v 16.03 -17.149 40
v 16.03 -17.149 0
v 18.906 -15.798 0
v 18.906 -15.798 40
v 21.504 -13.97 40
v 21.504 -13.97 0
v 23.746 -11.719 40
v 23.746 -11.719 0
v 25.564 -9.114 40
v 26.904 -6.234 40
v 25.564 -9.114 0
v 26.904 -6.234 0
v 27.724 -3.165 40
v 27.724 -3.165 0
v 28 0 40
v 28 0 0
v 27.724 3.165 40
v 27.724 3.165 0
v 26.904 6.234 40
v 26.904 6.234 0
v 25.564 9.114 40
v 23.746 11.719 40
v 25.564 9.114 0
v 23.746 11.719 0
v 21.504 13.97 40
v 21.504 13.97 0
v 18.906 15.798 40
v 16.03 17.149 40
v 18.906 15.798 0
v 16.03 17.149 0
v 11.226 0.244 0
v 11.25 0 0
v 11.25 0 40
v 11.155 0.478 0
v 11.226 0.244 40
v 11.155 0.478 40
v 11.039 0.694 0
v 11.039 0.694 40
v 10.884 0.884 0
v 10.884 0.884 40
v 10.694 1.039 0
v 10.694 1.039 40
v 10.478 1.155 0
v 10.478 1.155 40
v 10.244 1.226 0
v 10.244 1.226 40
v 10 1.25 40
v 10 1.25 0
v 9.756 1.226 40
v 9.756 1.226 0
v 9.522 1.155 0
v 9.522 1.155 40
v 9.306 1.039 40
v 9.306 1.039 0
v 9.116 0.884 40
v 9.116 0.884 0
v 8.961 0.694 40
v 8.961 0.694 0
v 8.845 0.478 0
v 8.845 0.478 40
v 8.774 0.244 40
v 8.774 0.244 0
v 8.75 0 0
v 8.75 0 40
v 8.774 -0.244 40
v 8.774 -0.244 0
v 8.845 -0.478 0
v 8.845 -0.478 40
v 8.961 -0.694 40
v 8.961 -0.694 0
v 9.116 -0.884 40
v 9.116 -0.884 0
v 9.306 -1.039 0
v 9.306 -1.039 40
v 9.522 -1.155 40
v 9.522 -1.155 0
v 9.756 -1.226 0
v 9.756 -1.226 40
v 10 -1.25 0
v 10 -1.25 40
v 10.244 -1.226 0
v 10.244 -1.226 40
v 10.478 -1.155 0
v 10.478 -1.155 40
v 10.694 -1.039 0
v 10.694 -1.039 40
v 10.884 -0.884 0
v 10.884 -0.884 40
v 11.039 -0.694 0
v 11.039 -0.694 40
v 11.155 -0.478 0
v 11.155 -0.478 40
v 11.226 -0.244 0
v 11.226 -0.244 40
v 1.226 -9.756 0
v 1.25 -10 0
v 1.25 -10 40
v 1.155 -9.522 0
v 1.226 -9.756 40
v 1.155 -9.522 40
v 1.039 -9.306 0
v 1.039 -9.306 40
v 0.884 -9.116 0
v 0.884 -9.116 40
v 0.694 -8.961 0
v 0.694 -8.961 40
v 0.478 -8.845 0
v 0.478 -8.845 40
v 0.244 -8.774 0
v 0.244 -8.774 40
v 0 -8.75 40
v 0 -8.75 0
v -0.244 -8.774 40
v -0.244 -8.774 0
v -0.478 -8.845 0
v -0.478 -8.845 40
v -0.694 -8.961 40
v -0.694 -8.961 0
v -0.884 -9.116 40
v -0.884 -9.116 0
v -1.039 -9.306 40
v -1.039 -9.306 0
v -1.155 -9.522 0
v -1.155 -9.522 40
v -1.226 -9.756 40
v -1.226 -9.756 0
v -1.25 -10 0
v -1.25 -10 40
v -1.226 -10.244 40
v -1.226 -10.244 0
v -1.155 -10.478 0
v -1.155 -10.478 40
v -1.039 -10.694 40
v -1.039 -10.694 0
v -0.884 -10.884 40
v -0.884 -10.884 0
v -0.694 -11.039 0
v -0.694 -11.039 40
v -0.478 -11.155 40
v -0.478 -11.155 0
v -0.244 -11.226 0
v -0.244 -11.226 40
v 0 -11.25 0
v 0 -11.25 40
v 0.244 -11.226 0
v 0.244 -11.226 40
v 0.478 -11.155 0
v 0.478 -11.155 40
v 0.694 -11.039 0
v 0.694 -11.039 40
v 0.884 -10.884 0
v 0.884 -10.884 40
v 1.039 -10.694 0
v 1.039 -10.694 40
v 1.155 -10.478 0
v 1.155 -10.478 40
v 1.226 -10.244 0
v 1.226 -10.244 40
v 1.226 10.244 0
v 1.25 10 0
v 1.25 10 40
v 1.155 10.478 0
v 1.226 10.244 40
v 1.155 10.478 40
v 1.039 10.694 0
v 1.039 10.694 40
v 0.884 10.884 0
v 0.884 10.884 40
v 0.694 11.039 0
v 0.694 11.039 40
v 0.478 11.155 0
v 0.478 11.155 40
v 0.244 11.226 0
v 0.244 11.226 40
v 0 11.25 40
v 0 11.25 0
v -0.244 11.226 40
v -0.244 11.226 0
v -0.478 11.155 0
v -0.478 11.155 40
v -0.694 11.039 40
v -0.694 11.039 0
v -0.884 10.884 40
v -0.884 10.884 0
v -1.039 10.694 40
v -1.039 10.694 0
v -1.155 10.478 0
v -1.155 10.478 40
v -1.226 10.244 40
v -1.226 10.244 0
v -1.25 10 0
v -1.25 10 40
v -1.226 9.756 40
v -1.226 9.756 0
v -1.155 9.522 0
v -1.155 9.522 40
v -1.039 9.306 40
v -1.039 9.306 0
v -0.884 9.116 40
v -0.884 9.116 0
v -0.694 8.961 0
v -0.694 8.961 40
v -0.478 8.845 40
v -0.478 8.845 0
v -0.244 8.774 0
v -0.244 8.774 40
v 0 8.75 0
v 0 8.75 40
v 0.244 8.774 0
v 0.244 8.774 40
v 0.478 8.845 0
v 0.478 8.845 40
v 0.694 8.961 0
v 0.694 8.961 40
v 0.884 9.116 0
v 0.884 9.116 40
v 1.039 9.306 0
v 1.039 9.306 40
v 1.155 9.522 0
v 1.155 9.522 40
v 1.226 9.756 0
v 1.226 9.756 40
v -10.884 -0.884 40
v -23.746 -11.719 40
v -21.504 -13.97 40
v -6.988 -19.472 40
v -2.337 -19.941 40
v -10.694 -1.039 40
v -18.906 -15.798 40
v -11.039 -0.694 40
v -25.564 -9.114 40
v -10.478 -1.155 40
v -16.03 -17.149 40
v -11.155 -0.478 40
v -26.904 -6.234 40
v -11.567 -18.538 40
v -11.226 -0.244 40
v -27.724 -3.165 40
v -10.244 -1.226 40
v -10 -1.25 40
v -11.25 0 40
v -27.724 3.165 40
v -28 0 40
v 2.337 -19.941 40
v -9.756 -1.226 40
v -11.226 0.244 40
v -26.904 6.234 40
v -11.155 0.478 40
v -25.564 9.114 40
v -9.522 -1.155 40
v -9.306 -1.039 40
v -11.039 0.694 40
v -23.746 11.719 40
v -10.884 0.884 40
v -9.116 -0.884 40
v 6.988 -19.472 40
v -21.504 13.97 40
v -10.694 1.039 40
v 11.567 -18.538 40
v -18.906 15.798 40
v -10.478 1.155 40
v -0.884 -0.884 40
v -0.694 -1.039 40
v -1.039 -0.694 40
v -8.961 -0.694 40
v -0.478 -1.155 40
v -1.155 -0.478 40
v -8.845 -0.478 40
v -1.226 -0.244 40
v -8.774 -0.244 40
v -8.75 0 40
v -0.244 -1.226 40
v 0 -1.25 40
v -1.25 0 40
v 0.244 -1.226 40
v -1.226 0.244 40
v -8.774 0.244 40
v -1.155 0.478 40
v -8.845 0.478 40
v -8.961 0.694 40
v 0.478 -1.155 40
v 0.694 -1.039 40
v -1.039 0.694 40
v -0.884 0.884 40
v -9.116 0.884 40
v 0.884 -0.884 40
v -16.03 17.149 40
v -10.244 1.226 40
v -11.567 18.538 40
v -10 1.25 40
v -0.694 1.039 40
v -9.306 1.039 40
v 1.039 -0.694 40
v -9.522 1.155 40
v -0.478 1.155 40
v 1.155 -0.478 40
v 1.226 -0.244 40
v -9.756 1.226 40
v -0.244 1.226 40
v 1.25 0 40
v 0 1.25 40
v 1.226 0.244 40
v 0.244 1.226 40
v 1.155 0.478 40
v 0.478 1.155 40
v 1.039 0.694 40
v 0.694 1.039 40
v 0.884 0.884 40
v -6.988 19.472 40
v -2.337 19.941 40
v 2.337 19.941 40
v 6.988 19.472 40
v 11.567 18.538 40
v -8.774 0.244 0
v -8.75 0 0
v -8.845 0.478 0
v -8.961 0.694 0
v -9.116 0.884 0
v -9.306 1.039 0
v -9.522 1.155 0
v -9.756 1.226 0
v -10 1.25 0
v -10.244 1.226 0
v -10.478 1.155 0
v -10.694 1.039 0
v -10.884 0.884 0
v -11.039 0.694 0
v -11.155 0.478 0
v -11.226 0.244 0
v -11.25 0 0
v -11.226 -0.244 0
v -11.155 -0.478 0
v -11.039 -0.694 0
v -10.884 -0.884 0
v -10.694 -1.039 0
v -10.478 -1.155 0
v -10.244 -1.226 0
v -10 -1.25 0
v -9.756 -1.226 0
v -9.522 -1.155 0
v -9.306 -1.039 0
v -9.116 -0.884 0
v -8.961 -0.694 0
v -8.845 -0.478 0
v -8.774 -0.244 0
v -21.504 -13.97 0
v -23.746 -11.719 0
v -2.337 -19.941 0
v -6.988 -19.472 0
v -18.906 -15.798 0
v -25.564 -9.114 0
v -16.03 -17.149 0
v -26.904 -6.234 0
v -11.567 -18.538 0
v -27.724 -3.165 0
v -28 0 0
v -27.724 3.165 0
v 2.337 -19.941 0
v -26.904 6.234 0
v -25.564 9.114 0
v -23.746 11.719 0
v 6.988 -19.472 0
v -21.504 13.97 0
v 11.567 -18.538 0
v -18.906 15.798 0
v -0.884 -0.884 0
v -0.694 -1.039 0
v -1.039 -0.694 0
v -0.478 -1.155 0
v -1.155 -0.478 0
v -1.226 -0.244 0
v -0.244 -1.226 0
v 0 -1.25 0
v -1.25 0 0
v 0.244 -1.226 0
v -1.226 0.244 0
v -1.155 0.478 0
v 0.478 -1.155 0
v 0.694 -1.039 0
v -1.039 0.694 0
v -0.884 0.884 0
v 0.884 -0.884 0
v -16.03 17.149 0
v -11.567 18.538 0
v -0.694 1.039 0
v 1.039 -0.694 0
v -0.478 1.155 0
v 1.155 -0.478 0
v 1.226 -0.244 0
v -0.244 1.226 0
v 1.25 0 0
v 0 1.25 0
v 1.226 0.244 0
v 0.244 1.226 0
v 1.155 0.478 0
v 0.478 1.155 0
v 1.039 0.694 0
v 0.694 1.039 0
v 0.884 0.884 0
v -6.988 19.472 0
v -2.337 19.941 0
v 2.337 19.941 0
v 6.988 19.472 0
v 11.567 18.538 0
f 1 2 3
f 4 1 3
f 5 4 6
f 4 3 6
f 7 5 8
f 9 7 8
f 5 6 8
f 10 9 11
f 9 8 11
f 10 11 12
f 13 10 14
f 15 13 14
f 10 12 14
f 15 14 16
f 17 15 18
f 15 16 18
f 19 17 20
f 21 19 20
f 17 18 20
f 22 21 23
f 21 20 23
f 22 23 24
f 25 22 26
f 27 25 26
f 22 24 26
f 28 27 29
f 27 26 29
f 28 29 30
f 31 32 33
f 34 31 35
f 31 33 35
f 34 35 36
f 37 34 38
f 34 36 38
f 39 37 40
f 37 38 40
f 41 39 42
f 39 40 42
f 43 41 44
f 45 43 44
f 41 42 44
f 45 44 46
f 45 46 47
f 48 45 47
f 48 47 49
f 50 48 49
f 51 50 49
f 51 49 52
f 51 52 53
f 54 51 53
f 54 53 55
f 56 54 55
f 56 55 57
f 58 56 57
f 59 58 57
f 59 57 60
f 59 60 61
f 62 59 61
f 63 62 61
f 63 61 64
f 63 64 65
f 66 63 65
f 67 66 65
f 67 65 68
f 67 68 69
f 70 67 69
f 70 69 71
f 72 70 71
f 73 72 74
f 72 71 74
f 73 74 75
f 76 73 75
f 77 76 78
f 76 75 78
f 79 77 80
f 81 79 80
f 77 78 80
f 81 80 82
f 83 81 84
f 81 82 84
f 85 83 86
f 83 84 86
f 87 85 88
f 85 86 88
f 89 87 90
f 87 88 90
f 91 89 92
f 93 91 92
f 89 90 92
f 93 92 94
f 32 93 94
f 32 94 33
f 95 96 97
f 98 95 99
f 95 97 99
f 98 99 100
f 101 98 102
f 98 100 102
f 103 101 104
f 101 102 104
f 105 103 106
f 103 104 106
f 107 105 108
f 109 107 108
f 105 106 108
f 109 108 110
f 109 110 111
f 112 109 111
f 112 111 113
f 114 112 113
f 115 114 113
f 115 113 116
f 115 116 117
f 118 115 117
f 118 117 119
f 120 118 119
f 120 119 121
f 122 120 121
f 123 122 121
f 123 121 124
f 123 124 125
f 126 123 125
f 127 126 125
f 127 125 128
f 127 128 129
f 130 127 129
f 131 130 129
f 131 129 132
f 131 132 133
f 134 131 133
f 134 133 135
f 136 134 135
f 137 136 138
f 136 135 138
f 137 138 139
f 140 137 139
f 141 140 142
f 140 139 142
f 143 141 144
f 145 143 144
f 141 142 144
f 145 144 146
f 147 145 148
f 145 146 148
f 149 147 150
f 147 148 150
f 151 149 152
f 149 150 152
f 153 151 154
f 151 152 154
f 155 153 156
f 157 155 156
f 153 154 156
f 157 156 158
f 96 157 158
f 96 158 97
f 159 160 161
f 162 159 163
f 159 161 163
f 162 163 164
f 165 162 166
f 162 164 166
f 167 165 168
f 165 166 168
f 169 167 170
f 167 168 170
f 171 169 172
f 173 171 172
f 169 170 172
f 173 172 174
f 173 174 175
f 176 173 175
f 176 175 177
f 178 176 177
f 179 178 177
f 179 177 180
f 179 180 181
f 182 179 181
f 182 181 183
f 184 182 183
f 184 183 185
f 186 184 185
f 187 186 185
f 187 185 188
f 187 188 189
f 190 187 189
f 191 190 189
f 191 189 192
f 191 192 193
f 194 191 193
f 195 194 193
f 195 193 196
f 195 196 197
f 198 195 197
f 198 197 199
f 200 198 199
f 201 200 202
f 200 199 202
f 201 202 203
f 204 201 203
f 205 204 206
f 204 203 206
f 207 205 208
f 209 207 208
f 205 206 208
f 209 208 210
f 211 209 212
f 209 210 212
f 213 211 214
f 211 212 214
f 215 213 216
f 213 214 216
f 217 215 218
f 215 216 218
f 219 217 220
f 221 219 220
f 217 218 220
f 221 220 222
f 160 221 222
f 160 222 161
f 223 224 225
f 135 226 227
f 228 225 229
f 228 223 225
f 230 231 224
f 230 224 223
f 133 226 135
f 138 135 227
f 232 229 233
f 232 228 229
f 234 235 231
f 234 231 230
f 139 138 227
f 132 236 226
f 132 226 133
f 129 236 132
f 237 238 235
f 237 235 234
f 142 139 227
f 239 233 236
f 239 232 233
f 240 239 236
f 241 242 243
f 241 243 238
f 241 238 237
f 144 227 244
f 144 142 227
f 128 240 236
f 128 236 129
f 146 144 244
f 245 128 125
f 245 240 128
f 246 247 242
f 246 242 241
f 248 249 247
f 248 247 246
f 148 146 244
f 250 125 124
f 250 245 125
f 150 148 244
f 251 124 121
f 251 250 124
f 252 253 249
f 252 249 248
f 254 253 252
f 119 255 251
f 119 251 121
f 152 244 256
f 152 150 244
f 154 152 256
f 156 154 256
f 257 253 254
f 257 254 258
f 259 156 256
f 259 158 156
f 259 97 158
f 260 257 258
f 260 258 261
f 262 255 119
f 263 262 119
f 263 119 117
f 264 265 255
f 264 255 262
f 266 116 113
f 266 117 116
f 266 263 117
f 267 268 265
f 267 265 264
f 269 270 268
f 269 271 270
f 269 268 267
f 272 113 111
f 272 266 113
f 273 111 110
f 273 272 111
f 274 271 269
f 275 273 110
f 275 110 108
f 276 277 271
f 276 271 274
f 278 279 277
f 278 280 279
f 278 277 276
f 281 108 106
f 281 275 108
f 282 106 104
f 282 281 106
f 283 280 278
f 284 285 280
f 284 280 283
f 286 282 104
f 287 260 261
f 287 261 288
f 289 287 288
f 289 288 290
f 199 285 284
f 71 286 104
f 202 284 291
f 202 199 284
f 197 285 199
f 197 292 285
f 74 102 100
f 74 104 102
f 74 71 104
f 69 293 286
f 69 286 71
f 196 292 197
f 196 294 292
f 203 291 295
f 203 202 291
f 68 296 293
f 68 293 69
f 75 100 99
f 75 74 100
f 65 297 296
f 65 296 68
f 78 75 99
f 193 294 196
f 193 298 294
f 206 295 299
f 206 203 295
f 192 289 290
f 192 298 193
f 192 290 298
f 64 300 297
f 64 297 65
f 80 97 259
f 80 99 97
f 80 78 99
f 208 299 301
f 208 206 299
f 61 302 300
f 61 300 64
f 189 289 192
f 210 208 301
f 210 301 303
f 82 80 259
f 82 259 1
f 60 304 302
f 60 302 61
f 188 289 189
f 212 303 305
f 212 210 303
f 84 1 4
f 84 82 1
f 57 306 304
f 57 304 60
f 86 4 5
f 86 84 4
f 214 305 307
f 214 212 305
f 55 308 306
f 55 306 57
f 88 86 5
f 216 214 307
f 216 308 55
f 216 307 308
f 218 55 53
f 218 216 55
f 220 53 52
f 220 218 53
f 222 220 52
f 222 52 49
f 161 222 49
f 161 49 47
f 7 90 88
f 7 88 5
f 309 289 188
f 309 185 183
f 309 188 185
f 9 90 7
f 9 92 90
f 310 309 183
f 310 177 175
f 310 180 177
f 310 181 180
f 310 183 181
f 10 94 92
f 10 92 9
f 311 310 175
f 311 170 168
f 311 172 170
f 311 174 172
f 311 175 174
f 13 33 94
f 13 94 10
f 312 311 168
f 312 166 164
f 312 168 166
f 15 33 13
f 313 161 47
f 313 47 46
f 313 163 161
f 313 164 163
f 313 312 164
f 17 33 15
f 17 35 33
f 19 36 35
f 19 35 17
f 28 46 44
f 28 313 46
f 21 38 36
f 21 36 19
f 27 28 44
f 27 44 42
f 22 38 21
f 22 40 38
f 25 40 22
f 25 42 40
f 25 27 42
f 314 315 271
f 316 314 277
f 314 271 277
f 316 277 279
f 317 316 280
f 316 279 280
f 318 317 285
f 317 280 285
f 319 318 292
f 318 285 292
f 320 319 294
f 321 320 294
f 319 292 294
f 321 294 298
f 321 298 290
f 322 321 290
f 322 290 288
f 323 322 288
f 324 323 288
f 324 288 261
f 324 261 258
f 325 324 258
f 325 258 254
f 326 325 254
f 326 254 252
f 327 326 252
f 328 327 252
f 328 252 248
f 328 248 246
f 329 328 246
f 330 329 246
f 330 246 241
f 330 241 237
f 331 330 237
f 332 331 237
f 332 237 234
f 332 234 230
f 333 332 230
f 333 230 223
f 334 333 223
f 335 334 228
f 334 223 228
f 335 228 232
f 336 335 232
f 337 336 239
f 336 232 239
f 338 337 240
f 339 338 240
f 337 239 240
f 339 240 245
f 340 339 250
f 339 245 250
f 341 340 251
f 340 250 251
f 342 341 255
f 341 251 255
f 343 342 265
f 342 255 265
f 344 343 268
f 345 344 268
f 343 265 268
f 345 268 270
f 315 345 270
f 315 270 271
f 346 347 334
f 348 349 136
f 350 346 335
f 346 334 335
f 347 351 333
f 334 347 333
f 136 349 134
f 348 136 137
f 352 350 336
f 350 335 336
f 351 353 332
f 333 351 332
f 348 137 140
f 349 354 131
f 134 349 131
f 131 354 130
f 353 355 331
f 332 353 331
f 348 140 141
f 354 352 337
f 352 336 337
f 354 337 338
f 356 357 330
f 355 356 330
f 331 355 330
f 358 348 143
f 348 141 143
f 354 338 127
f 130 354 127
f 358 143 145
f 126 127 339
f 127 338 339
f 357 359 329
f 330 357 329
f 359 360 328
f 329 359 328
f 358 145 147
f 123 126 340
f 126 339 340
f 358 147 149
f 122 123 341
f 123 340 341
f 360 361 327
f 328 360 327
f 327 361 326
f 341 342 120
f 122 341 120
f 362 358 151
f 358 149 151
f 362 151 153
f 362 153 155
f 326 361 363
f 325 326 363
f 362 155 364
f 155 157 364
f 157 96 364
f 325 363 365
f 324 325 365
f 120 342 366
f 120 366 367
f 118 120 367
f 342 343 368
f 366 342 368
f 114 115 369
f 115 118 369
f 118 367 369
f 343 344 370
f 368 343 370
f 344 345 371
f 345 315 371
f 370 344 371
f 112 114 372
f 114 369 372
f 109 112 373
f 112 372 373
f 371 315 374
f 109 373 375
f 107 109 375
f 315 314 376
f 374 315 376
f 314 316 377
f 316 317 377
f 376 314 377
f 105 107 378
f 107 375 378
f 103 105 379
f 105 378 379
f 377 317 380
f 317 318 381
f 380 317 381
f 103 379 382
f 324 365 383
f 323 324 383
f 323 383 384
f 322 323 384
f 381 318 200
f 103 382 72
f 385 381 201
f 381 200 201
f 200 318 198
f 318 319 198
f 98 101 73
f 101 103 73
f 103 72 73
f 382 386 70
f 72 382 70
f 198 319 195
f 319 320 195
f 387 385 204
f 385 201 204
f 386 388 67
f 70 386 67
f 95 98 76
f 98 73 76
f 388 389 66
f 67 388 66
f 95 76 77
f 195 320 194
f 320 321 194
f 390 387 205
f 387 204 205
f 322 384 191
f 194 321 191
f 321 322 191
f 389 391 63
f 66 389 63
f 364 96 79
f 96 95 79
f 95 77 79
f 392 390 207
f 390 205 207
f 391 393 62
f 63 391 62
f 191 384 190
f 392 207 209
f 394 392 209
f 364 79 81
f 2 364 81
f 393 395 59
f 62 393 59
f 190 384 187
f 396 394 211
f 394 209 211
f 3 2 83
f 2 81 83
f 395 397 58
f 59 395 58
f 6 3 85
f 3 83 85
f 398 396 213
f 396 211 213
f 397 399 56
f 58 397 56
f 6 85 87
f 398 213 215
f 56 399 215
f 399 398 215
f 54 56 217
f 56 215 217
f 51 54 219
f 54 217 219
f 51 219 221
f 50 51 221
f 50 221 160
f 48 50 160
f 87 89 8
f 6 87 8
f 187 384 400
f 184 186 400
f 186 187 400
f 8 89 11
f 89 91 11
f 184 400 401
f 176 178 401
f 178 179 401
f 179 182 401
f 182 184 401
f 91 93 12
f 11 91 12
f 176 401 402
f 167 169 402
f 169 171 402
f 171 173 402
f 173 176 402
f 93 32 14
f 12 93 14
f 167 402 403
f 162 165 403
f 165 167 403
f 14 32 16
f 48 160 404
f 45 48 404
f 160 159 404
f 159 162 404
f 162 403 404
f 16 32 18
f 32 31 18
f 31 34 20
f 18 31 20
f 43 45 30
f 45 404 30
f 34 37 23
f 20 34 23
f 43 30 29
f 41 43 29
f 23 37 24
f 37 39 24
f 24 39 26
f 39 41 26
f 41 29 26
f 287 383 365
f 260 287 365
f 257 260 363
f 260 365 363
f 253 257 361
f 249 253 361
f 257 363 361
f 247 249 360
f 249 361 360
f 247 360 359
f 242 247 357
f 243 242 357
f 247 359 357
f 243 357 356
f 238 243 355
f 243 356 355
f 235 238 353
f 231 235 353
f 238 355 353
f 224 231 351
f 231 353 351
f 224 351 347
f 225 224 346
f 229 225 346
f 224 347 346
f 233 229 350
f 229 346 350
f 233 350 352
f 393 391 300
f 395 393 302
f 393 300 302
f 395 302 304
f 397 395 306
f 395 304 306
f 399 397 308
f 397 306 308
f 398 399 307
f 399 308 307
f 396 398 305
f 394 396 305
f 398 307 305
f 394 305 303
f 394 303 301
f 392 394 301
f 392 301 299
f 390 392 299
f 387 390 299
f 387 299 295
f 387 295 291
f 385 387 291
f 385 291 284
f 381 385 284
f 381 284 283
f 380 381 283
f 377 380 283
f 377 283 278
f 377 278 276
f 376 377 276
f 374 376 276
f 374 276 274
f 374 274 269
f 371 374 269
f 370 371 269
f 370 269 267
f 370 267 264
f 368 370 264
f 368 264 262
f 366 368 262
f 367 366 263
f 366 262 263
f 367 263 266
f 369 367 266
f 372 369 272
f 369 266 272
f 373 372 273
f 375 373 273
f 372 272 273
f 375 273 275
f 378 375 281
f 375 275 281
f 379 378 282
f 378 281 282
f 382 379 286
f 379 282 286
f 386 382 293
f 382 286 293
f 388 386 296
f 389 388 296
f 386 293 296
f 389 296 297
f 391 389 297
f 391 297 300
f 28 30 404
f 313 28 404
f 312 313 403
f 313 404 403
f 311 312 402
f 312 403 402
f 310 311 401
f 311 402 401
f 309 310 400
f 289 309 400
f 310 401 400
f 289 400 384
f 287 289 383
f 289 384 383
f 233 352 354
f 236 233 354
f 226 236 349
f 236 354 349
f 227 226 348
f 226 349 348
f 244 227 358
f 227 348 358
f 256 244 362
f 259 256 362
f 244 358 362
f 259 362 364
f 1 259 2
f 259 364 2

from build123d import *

# Parameters (mm, degrees)
BOSS_EXTRUDE1_DEPTH = 40
SKETCH2_R           = 1.25
CUT_EXTRUDE1_DEPTH  = 41


with BuildPart() as part:
    # Sketch1 → Boss-Extrude1 (new body)
    with BuildSketch(Plane.XY):
        with BuildLine():
            ThreePointArc((-16.03038595, 17.148754429), (-28, 0), (-16.03038595, -17.148754429))
            ThreePointArc((-16.03038595, -17.148754429), (0, -20), (16.03038595, -17.148754429))
            ThreePointArc((16.03038595, -17.148754429), (28, 0), (16.03038595, 17.148754429))
            ThreePointArc((16.03038595, 17.148754429), (0, 20), (-16.03038595, 17.148754429))
        make_face()
    extrude(amount=BOSS_EXTRUDE1_DEPTH)

    # Sketch2 → Cut-Extrude1 (cut, through all)
    with BuildSketch(Plane.XY.offset(40)):
        with Locations((0, 10)):
            Circle(SKETCH2_R)
        with Locations((10, 0)):
            Circle(SKETCH2_R)
        with Locations((0, -10)):
            Circle(SKETCH2_R)
        with Locations((-10, 0)):
            Circle(SKETCH2_R)
        Circle(SKETCH2_R)
    extrude(amount=-CUT_EXTRUDE1_DEPTH, mode=Mode.SUBTRACT)


solid = part.part
